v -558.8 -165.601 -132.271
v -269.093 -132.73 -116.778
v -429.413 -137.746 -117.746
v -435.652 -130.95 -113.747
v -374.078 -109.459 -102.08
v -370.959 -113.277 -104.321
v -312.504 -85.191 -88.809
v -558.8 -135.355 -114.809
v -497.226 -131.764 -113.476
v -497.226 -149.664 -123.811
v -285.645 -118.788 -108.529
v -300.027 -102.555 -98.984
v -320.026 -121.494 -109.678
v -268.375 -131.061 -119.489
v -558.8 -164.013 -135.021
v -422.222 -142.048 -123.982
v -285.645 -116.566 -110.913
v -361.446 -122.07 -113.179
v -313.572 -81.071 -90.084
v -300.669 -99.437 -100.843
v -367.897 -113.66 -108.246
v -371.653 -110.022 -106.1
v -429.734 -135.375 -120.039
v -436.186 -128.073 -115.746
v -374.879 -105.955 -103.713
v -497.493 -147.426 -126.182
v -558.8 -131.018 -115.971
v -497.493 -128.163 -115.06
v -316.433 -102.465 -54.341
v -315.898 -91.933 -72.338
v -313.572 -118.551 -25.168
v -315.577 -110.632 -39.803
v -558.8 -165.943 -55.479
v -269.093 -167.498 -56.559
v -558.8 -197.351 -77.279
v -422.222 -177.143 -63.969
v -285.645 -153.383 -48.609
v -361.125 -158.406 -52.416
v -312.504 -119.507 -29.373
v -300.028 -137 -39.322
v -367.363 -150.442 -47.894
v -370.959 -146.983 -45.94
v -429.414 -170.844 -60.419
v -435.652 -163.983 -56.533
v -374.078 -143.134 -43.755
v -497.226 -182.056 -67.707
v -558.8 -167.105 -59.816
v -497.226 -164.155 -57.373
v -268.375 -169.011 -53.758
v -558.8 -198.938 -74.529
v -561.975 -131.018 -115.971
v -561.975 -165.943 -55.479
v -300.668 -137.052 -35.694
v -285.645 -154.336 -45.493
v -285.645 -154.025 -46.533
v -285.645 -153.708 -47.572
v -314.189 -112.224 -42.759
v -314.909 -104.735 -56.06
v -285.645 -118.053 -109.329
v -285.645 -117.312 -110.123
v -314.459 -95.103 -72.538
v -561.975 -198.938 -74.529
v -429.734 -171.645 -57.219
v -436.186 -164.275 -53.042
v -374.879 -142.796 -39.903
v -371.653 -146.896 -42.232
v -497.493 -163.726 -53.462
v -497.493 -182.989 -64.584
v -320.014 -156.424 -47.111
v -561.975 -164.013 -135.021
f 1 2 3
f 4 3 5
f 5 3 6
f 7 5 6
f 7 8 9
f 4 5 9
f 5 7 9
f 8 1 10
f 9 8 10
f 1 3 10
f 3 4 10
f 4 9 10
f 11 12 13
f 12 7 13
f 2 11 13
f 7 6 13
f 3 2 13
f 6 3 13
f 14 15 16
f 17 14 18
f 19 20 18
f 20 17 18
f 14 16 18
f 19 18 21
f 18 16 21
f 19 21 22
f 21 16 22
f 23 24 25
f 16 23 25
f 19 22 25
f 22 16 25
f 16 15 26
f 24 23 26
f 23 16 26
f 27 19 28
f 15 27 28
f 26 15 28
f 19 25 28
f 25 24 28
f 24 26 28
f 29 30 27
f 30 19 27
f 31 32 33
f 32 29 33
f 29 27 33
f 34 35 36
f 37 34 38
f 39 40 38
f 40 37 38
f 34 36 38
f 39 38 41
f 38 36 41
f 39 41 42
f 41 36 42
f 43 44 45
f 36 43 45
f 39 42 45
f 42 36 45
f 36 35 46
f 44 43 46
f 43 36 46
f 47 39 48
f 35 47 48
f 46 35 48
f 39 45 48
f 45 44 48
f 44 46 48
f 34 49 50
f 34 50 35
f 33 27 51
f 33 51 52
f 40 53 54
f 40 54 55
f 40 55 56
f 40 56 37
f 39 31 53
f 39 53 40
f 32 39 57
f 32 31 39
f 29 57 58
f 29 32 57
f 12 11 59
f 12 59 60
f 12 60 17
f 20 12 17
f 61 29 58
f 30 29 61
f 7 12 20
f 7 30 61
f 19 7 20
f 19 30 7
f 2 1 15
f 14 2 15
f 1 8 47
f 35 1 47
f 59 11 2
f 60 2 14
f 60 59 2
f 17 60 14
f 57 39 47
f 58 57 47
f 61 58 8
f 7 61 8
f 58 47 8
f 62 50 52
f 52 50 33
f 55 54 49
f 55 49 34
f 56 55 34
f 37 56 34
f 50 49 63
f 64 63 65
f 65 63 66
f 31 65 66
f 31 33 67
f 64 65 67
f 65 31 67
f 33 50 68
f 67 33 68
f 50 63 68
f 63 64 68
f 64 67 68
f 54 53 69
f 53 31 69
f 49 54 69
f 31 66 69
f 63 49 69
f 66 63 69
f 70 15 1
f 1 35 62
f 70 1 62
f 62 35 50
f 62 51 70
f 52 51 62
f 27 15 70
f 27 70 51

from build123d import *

# Parameters (mm, degrees)
SKETCH117_W             = 69.85
SKETCH117_H             = 38.1
PAD025_DEPTH            = 3.175
BODY035_PLACEMENT_ANGLE = 120


with BuildPart() as part:
    # Sketch115 → AdditiveLoft002 section 0
    with BuildSketch(Plane(origin=(-254, 0, 101.6), x_dir=(0, 1, 0), z_dir=(1, 0, 0))):
        Polygon((-38.1, 69.85), (-38.1, 0), (38.1, 0), (38.1, 69.8500000001), (34.925, 69.8500000001), (34.925, 3.175), (-34.925, 3.175), (-34.925, 69.85), align=None)
    # Sketch116 → AdditiveLoft002 section 1
    with BuildSketch(Plane(origin=(-558.8, 0, 127), x_dir=(0, 1, 0), z_dir=(1, 0, 0))):
        Polygon((-34.925, 82.55), (-34.925, 44.45), (34.925, 44.45), (34.925, 82.55), (31.75, 82.55), (31.75, 47.625), (-31.75, 47.625), (-31.75, 82.55), align=None)
    loft()

    # Sketch117 (on Face3 of AdditiveLoft002) → Pad025 (new body)
    with BuildSketch(Plane(origin=(-558.8, 0, 101.6), x_dir=(0, 1, 0), z_dir=(-1, 0, 0))):
        with Locations((0, -88.9)):
            Rectangle(SKETCH117_W, SKETCH117_H)
    extrude(amount=PAD025_DEPTH)

    # Sketch118 → Groove004 (revolve, cut)
    with BuildSketch(Plane.XZ):
        with BuildLine():
            ThreePointArc((-285.6448342114, 160.9012244898), (-330.0079117171, 85.8263739972), (-345.44, 0))
            Line((-345.44, 0), (0, 0))
            Line((0, 203.2), (0, 0))
            Line((-193.3141946016, 203.2), (0, 203.2))
            ThreePointArc((-193.3141946016, 203.2), (-244.0934556744, 192.1220184086), (-285.6448342114, 160.9012244898))
        make_face()
    revolve(axis=Axis((0, 0, 0), (1, 0, 0)), mode=Mode.SUBTRACT)


with BuildPart() as part_1:
    # Body035 placement: moved
    add(part.part.rotate(Axis((0, 0, 0), (1, 0, 0)), BODY035_PLACEMENT_ANGLE))


solid = part_1.part
